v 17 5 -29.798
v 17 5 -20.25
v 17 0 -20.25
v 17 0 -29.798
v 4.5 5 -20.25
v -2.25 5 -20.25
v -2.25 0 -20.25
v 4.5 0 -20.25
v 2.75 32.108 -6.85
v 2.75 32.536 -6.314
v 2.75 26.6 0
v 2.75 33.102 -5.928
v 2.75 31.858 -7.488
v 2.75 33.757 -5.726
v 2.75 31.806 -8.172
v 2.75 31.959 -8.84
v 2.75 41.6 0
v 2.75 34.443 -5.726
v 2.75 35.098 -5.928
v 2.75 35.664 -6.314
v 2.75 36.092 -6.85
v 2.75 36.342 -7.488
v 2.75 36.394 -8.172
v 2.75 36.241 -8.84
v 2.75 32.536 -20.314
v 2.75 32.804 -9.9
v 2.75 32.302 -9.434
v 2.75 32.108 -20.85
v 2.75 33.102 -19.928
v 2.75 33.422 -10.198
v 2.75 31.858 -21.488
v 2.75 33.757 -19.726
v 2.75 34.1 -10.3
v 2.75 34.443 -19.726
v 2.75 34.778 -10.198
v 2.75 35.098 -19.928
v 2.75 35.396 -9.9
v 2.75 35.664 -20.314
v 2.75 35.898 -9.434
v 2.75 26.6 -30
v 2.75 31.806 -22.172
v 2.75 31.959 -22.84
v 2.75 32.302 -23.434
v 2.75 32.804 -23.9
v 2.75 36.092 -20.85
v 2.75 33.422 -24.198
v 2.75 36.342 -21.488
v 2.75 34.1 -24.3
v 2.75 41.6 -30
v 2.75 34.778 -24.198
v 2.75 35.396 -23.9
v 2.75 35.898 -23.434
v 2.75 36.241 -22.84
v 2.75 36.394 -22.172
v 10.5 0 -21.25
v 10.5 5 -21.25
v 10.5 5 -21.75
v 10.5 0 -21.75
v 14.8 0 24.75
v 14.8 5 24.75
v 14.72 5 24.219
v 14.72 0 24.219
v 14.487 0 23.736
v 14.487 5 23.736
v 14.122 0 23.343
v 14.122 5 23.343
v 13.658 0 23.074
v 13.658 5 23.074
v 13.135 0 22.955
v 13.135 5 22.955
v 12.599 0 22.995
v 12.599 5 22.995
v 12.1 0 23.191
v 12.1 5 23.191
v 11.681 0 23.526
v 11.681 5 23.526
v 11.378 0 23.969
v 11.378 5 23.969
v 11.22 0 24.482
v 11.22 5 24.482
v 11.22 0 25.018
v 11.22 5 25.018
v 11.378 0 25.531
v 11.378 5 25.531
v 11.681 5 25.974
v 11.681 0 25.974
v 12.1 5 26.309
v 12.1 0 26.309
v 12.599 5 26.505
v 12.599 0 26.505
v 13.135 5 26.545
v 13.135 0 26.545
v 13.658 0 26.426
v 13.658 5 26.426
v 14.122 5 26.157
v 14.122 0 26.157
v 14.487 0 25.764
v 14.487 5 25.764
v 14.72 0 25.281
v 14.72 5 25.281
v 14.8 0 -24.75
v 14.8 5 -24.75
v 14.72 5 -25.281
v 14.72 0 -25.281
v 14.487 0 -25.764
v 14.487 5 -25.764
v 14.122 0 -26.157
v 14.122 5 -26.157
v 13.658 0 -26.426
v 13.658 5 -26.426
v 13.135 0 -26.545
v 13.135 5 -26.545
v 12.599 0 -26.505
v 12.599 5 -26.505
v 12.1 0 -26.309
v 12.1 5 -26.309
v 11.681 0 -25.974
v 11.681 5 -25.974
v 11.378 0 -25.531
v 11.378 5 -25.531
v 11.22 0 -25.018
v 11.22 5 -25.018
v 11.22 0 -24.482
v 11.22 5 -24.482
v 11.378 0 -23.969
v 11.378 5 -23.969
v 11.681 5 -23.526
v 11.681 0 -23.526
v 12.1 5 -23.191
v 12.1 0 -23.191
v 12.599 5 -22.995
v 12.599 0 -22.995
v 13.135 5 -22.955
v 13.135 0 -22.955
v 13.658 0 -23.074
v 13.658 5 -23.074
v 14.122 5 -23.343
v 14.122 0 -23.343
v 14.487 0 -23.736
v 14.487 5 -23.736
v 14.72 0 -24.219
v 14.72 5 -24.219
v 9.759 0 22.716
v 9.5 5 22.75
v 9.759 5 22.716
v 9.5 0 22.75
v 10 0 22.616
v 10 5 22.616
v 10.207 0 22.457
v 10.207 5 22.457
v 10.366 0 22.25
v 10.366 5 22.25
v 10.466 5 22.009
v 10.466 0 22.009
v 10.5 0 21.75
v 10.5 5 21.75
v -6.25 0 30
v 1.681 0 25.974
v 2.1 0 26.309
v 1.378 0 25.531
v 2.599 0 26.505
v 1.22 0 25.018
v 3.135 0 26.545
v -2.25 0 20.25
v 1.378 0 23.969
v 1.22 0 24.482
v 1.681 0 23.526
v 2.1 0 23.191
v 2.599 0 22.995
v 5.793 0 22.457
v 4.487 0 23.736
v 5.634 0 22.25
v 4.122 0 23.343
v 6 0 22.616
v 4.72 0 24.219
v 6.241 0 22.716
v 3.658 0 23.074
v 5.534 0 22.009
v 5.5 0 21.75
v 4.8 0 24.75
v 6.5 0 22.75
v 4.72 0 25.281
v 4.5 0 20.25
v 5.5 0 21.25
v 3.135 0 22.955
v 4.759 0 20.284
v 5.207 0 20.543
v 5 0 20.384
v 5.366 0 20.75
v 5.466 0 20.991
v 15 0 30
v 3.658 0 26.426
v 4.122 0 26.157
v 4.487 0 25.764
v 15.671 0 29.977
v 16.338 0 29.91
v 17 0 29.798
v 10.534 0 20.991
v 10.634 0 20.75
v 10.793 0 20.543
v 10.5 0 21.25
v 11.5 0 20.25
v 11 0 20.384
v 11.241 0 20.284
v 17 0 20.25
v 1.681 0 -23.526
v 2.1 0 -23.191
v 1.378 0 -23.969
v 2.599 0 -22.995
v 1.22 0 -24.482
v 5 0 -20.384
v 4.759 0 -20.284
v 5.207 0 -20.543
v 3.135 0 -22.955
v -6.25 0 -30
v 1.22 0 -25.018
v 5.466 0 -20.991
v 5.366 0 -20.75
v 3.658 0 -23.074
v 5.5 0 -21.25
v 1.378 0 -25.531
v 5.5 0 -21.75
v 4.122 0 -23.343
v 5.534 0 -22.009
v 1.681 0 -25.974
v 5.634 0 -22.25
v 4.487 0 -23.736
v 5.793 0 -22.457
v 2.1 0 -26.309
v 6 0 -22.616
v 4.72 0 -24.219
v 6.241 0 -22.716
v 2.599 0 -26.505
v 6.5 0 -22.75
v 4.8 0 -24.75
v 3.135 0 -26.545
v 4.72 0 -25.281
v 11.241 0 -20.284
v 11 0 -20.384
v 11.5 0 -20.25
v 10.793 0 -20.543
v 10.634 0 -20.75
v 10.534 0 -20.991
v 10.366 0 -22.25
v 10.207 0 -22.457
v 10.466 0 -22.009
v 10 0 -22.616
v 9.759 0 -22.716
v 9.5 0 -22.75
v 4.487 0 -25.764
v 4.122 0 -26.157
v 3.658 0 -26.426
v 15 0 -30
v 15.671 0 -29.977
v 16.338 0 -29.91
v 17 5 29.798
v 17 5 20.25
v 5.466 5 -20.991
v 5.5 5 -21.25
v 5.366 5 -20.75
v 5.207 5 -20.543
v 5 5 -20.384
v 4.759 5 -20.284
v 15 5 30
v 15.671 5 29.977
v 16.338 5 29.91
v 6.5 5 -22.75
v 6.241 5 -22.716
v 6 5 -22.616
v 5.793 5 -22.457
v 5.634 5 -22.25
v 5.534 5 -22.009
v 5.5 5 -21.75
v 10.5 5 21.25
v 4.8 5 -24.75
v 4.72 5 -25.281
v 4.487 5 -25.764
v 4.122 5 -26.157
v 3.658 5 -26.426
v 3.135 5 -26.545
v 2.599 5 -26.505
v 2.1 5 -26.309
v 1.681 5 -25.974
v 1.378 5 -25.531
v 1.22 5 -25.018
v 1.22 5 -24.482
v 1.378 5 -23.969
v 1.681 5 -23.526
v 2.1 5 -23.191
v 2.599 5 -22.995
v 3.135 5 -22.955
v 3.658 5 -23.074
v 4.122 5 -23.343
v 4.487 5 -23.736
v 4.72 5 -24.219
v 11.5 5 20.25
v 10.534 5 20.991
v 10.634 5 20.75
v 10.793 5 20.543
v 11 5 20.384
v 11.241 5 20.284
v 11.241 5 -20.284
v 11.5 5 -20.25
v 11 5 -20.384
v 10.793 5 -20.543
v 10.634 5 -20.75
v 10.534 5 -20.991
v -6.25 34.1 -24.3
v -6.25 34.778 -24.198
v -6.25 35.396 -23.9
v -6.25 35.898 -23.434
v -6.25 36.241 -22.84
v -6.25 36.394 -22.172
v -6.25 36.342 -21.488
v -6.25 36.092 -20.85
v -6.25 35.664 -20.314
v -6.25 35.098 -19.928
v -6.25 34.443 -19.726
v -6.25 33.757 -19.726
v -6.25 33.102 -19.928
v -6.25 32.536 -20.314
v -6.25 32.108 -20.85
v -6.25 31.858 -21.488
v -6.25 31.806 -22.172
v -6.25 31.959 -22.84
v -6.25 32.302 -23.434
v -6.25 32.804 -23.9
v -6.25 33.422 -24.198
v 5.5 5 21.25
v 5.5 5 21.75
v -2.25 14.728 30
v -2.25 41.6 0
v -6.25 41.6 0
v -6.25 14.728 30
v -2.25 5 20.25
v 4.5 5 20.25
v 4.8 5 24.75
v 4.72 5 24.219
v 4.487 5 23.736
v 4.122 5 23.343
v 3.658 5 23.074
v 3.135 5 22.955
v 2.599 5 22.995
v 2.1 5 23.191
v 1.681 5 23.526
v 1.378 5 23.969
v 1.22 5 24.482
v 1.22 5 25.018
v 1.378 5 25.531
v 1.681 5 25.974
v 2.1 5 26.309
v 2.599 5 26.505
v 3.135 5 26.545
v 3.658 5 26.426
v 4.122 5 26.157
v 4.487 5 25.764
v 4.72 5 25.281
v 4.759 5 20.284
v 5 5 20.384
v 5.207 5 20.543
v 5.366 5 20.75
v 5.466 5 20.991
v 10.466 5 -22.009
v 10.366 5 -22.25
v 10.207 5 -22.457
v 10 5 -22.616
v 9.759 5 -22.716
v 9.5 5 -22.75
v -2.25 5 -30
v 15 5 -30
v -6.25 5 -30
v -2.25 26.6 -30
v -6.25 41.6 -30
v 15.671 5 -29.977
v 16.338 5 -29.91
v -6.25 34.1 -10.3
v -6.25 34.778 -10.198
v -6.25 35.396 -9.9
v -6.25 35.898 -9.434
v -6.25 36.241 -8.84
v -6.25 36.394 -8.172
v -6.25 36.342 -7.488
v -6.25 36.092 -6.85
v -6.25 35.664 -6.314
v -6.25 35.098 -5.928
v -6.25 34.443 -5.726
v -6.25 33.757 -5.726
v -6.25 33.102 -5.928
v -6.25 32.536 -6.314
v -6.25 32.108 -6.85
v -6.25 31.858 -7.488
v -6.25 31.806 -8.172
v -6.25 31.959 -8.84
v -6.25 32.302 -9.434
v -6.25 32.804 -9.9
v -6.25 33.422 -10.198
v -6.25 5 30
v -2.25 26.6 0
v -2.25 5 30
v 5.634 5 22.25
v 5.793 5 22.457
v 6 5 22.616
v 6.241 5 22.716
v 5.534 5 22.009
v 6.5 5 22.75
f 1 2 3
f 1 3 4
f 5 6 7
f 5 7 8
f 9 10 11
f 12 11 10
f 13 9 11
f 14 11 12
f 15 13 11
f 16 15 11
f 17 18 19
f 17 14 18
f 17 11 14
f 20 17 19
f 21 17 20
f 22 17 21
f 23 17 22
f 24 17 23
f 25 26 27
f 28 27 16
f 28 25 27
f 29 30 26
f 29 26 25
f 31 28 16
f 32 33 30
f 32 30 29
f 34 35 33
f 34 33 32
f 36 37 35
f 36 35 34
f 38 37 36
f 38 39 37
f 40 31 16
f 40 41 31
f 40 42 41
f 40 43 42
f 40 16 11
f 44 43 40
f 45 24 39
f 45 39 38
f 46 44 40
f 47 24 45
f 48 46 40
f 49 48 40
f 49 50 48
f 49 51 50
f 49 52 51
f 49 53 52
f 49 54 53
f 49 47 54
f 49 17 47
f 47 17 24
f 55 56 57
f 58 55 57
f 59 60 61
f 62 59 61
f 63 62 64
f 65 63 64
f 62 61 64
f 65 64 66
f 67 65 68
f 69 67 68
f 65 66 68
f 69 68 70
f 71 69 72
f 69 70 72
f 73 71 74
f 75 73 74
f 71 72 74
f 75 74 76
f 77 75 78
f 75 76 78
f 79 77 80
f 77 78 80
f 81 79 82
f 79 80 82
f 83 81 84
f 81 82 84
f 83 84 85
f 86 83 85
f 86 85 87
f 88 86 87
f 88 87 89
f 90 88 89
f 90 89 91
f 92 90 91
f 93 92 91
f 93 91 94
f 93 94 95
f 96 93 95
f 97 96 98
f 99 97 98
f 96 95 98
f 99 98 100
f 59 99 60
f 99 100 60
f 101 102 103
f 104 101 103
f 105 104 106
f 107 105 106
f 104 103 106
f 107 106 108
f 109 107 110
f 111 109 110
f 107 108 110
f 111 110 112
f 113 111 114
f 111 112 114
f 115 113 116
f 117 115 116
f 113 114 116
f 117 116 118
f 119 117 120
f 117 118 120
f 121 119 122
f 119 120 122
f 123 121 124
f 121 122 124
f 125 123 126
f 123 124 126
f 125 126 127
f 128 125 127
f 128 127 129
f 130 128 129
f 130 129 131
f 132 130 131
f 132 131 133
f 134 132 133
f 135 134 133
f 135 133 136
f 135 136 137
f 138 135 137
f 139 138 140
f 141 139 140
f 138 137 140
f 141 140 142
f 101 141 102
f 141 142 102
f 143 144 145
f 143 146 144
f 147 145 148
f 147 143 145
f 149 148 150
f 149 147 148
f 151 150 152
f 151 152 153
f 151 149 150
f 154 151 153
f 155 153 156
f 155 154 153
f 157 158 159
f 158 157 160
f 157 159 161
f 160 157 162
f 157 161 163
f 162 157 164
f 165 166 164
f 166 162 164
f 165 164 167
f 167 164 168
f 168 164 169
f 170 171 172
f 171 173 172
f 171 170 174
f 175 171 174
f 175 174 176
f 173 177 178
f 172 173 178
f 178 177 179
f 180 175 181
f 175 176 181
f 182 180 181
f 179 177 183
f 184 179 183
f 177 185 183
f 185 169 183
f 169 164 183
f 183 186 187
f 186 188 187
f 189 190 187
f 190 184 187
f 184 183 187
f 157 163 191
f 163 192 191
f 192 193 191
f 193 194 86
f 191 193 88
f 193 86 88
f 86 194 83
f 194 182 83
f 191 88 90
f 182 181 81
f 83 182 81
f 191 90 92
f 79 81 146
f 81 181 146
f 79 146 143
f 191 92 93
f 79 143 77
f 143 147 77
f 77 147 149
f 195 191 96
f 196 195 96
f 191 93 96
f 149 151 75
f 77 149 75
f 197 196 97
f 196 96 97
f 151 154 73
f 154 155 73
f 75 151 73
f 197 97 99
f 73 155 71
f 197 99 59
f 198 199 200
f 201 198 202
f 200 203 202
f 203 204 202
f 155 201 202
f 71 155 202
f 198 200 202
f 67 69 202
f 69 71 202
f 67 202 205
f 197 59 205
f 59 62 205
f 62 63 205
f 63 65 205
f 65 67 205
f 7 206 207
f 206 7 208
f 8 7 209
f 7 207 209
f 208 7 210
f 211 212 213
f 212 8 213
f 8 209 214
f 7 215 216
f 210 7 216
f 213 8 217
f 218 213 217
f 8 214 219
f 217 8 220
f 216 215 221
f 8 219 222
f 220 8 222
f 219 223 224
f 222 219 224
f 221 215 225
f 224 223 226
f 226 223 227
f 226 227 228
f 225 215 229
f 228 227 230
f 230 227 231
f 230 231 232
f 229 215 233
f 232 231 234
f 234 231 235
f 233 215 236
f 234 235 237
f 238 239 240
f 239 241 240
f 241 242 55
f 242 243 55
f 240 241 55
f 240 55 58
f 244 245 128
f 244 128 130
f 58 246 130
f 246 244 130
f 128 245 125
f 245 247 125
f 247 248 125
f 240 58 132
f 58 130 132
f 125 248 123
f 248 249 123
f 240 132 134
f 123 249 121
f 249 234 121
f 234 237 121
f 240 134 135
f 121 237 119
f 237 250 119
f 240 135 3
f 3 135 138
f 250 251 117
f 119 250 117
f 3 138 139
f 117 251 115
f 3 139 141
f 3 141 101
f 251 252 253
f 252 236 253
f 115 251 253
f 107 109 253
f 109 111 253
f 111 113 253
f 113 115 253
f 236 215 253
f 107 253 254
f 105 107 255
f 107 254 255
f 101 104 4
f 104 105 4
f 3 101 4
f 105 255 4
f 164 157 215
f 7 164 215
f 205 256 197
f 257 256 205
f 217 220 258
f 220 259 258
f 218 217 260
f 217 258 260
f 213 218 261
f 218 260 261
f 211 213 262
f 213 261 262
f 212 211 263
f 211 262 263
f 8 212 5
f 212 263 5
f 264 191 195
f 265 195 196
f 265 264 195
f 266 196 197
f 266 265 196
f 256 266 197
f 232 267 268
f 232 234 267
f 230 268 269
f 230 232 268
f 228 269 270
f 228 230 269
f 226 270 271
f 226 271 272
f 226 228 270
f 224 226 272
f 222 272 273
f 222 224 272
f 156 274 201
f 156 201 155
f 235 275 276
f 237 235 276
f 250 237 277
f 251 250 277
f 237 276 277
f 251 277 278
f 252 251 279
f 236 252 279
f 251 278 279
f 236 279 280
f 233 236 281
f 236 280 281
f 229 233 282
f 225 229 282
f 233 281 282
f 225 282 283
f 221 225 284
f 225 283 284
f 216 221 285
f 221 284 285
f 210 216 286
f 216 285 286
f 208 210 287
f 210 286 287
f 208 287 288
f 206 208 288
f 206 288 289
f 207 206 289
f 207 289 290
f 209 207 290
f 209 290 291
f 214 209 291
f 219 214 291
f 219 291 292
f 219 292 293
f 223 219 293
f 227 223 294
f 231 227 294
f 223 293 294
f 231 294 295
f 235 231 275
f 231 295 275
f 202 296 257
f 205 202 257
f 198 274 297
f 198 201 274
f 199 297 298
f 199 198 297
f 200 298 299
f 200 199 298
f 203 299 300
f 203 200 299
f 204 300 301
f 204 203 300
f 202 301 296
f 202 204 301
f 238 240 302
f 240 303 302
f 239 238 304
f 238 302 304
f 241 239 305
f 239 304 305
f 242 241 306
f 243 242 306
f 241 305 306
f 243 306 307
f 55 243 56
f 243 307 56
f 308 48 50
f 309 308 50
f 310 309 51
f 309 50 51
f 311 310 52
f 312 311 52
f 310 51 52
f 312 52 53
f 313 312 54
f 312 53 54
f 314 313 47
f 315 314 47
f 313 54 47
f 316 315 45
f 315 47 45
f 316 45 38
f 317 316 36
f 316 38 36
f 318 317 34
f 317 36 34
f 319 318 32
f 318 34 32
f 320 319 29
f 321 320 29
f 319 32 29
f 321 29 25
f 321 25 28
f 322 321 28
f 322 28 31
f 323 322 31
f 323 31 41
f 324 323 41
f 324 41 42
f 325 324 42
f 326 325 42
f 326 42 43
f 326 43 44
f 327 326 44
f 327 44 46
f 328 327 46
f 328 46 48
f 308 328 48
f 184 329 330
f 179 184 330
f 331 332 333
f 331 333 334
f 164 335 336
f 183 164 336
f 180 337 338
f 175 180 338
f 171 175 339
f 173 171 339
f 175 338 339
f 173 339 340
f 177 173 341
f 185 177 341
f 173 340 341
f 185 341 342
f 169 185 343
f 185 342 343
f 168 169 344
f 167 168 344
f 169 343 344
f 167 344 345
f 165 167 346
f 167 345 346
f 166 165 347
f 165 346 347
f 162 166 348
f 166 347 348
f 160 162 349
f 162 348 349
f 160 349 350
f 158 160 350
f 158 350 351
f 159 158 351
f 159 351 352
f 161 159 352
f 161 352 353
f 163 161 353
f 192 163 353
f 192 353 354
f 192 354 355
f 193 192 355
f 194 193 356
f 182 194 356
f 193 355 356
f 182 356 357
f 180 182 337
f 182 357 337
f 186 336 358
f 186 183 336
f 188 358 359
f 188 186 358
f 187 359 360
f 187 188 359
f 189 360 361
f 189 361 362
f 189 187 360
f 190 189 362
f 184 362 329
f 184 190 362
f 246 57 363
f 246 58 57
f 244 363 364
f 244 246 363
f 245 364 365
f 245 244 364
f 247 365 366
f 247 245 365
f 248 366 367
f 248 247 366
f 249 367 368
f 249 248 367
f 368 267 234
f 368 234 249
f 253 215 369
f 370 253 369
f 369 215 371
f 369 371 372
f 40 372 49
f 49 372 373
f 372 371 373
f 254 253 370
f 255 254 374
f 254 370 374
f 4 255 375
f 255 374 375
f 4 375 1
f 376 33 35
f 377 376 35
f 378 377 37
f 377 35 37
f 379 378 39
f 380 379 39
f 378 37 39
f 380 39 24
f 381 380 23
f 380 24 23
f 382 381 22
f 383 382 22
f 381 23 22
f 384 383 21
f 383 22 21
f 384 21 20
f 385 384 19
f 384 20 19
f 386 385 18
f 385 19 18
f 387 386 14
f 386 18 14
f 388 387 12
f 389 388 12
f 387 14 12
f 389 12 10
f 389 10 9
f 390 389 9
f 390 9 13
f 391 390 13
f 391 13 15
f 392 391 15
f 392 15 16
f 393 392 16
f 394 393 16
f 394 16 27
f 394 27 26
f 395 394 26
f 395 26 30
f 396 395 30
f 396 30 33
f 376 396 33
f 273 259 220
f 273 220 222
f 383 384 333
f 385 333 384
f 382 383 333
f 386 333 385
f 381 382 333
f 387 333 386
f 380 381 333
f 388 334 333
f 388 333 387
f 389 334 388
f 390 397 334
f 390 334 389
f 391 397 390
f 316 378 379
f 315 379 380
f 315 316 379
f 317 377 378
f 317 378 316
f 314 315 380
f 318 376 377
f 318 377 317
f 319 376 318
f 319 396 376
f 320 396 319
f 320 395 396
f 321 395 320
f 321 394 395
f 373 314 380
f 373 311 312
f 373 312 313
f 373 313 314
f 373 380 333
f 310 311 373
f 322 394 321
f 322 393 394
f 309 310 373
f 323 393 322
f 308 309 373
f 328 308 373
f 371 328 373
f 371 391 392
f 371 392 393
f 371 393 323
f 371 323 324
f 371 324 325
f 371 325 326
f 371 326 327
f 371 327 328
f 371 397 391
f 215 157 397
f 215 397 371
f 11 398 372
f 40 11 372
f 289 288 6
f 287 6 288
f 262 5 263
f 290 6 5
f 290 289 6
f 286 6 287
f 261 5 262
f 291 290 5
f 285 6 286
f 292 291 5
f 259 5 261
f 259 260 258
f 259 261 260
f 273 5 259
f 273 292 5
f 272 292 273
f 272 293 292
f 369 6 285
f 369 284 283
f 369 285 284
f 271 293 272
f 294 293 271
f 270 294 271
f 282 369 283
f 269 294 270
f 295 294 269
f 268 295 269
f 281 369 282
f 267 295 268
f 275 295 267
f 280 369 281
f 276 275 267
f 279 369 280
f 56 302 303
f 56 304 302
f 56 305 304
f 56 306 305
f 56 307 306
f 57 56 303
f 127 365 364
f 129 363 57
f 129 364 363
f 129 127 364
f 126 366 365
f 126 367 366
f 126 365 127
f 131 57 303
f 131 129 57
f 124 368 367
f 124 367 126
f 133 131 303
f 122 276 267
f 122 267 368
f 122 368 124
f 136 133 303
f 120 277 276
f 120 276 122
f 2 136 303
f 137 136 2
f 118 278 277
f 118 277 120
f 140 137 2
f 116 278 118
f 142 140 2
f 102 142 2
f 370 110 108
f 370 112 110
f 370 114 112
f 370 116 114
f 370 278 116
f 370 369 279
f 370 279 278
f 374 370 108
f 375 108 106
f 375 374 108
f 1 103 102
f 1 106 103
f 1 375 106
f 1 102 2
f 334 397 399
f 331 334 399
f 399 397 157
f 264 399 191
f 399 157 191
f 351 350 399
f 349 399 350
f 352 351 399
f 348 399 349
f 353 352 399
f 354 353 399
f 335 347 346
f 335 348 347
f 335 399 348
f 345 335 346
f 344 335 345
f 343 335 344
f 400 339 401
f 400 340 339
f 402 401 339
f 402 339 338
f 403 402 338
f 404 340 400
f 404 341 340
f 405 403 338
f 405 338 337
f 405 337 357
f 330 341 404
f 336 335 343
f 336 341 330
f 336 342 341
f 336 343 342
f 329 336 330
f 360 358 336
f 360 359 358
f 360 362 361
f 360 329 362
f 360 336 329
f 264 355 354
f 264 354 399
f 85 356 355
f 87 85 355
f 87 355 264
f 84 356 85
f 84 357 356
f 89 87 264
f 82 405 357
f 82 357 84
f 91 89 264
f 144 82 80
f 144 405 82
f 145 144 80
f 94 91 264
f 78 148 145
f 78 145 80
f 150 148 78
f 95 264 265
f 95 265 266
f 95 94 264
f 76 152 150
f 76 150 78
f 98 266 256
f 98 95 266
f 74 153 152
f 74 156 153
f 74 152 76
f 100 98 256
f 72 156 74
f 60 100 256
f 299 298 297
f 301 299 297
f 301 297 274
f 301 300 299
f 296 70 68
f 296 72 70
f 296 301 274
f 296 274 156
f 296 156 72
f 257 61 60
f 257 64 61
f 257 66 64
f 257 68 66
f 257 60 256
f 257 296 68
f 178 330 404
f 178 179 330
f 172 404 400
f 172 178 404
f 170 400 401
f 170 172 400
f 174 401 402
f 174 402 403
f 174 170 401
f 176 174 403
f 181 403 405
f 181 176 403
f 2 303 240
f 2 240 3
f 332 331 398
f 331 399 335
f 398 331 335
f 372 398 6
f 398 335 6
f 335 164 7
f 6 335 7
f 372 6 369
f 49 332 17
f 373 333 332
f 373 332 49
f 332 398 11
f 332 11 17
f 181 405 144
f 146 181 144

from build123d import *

# Parameters (mm, degrees)
SKETCH1_W           = 50
SKETCH1_H           = 60
BOSS_EXTRUDE1_DEPTH = 5
SKETCH2_W           = 20.5
SKETCH2_H           = 40.5
CUT_EXTRUDE1_DEPTH  = 5
SKETCH3_R           = 1.8
CUT_EXTRUDE2_DEPTH  = 5
SKETCH4_R           = 2.5
CUT_EXTRUDE3_DEPTH  = 5
FILLET1_R           = 10
SKETCH5_W           = 5
SKETCH5_H           = 5
CUT_EXTRUDE4_DEPTH  = 10
FILLET2_R           = 1
SKETCH6_W           = 17.943789306
SKETCH6_H           = 60
CUT_EXTRUDE5_DEPTH  = 10
SKETCH7_W           = 4
SKETCH7_H           = 60
BOSS_EXTRUDE2_DEPTH = 36.6
SKETCH8_W           = 21.864927769
SKETCH8_H           = 69.948880873
CUT_EXTRUDE6_DEPTH  = 24
SKETCH9_W           = 30
SKETCH9_H           = 15
BOSS_EXTRUDE3_DEPTH = 5
CUT_EXTRUDE7_DEPTH  = 5
SKETCH11_R          = 2.3
CUT_EXTRUDE8_DEPTH  = 13


with BuildPart() as part:
    # Sketch1 → Boss-Extrude1 (new body)
    with BuildSketch(Plane(origin=(0, 0, 0), x_dir=(1, 0, 0), z_dir=(0, 1, 0))):
        Rectangle(SKETCH1_W, SKETCH1_H)
    extrude(amount=BOSS_EXTRUDE1_DEPTH)

    # Sketch2 → Cut-Extrude1 (cut)
    with BuildSketch(Plane(origin=(0, 5, 0), x_dir=(1, 0, 0), z_dir=(0, 1, 0))):
        with Locations((8, 0)):
            Rectangle(SKETCH2_W, SKETCH2_H)
    extrude(amount=-CUT_EXTRUDE1_DEPTH, mode=Mode.SUBTRACT)

    # Sketch3 → Cut-Extrude2 (cut)
    with BuildSketch(Plane(origin=(0, 5, 0), x_dir=(1, 0, 0), z_dir=(0, 1, 0))):
        with Locations((3, 24.75)):
            Circle(SKETCH3_R)
        with Locations((13, 24.75)):
            Circle(SKETCH3_R)
        with Locations((13, -24.75)):
            Circle(SKETCH3_R)
        with Locations((3, -24.75)):
            Circle(SKETCH3_R)
    extrude(amount=-CUT_EXTRUDE2_DEPTH, mode=Mode.SUBTRACT)

    # Sketch4 → Cut-Extrude3 (cut)
    with BuildSketch(Plane(origin=(0, 5, 0), x_dir=(1, 0, 0), z_dir=(0, 1, 0))):
        with Locations((-17.5, 20)):
            Circle(SKETCH4_R)
        with Locations((-17.5, -20)):
            Circle(SKETCH4_R)
    extrude(amount=-CUT_EXTRUDE3_DEPTH, mode=Mode.SUBTRACT)

    # Fillet1
    fillet1_edges = [part.edges().sort_by_distance(p)[0] for p in [
        (-25, 2.5, -30),
        (25, 2.5, -30),
        (25, 2.5, 30),
        (-25, 2.5, 30),
    ]]
    fillet(fillet1_edges, radius=FILLET1_R)

    # Sketch5 → Cut-Extrude4 (cut)
    with BuildSketch(Plane(origin=(0, 5, 0), x_dir=(1, 0, 0), z_dir=(0, 1, 0))):
        with Locations((8, 20.25)):
            Rectangle(SKETCH5_W, SKETCH5_H)
    cut_extrude4 = extrude(amount=-CUT_EXTRUDE4_DEPTH, mode=Mode.SUBTRACT)

    # Mirror1: Cut-Extrude4 across plane
    add(cut_extrude4.mirror(Plane.XY), mode=Mode.SUBTRACT)

    # Fillet2
    fillet2_edges = [part.edges().sort_by_distance(p)[0] for p in [
        (10.5, 2.5, 20.25),
        (5.5, 2.5, 20.25),
        (10.5, 2.5, 22.75),
        (5.5, 2.5, 22.75),
        (10.5, 2.5, -20.25),
        (5.5, 2.5, -20.25),
        (5.5, 2.5, -22.75),
        (10.5, 2.5, -22.75),
    ]]
    fillet(fillet2_edges, radius=FILLET2_R)

    # Sketch6 → Cut-Extrude5 (cut)
    with BuildSketch(Plane(origin=(0, 5, 0), x_dir=(1, 0, 0), z_dir=(0, 1, 0))):
        with Locations((25.971894653, 0)):
            Rectangle(SKETCH6_W, SKETCH6_H)
    extrude(amount=-CUT_EXTRUDE5_DEPTH, mode=Mode.SUBTRACT)

    # Sketch7 → Boss-Extrude2 (add)
    with BuildSketch(Plane(origin=(0, 5, 0), x_dir=(1, 0, 0), z_dir=(0, 1, 0))):
        with Locations((-4.25, 0)):
            Rectangle(SKETCH7_W, SKETCH7_H)
    extrude(amount=BOSS_EXTRUDE2_DEPTH)

    # Sketch8 → Cut-Extrude6 (cut)
    with BuildSketch(Plane(origin=(0, 5, 0), x_dir=(1, 0, 0), z_dir=(0, 1, 0))):
        with Locations((-17.182463885, 4.974440436)):
            Rectangle(SKETCH8_W, SKETCH8_H)
    extrude(amount=-CUT_EXTRUDE6_DEPTH, mode=Mode.SUBTRACT)

    # Sketch9 → Boss-Extrude3 (add)
    with BuildSketch(Plane(origin=(-2.25, 0, 0), x_dir=(0, 0, -1), z_dir=(1, 0, 0))):
        with Locations((15, 34.1)):
            Rectangle(SKETCH9_W, SKETCH9_H)
    extrude(amount=BOSS_EXTRUDE3_DEPTH)

    # Sketch10 → Cut-Extrude7 (cut)
    with BuildSketch(Plane(origin=(-2.25, 0, 0), x_dir=(0, 0, -1), z_dir=(1, 0, 0))):
        Polygon((0, 41.6), (-30, 14.728132264), (-30, 41.6), align=None)
    extrude(amount=-CUT_EXTRUDE7_DEPTH, mode=Mode.SUBTRACT)

    # Sketch11 → Cut-Extrude8 (cut)
    with BuildSketch(Plane(origin=(2.75, 0, 0), x_dir=(0, 0, -1), z_dir=(1, 0, 0))):
        with Locations((8, 34.1)):
            Circle(SKETCH11_R)
        with Locations((22, 34.1)):
            Circle(SKETCH11_R)
    extrude(amount=-CUT_EXTRUDE8_DEPTH, mode=Mode.SUBTRACT)


solid = part.part
